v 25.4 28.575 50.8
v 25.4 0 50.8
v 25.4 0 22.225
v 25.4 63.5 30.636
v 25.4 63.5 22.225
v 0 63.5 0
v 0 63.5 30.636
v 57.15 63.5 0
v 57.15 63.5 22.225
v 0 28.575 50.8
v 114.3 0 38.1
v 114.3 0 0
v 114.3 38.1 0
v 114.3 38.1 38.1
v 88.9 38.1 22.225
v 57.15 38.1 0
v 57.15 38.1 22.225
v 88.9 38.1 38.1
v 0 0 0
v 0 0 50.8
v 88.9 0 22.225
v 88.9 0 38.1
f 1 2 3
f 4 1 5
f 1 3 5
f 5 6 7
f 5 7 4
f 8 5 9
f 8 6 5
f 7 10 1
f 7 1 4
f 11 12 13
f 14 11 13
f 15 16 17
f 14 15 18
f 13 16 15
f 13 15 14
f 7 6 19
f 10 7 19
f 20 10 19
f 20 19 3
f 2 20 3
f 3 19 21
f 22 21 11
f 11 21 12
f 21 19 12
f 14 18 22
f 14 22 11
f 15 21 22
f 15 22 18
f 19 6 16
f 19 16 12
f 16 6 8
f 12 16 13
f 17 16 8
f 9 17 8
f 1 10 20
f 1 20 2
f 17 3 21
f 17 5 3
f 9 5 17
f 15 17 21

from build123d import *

# Parameters (mm, degrees)
BOSS_EXTRUDE1_DEPTH = 22.225
SKETCH1_3_W         = 25.4
SKETCH1_3_H         = 38.1
BOSS_EXTRUDE2_DEPTH = 38.1
SKETCH1_4_W         = 25.4
SKETCH1_4_H         = 63.5
BOSS_EXTRUDE3_DEPTH = 50.8
CUT_EXTRUDE1_DEPTH  = 25.4


with BuildPart() as part:
    # Sketch1 → Boss-Extrude1 (new body)
    with BuildSketch(Plane.XY):
        Polygon((25.4, 28.575), (25.4, 0), (88.9, 0), (88.9, 38.1), (57.15, 38.1), (57.15, 63.5), (25.4, 63.5), align=None)
    extrude(amount=BOSS_EXTRUDE1_DEPTH)

    # Sketch1<3> → Boss-Extrude2 (add)
    with BuildSketch(Plane.XY):
        with Locations((101.6, 19.05)):
            Rectangle(SKETCH1_3_W, SKETCH1_3_H)
    extrude(amount=BOSS_EXTRUDE2_DEPTH)

    # Sketch1<4> → Boss-Extrude3 (add)
    with BuildSketch(Plane.XY):
        with Locations((12.7, 31.75)):
            Rectangle(SKETCH1_4_W, SKETCH1_4_H)
    extrude(amount=BOSS_EXTRUDE3_DEPTH)

    # Sketch2 → Cut-Extrude1 (cut)
    with BuildSketch(Plane.ZY):
        Polygon((50.8, 28.575), (30.636041849, 63.5), (50.8, 63.5), align=None)
    extrude(amount=-CUT_EXTRUDE1_DEPTH, mode=Mode.SUBTRACT)


solid = part.part
